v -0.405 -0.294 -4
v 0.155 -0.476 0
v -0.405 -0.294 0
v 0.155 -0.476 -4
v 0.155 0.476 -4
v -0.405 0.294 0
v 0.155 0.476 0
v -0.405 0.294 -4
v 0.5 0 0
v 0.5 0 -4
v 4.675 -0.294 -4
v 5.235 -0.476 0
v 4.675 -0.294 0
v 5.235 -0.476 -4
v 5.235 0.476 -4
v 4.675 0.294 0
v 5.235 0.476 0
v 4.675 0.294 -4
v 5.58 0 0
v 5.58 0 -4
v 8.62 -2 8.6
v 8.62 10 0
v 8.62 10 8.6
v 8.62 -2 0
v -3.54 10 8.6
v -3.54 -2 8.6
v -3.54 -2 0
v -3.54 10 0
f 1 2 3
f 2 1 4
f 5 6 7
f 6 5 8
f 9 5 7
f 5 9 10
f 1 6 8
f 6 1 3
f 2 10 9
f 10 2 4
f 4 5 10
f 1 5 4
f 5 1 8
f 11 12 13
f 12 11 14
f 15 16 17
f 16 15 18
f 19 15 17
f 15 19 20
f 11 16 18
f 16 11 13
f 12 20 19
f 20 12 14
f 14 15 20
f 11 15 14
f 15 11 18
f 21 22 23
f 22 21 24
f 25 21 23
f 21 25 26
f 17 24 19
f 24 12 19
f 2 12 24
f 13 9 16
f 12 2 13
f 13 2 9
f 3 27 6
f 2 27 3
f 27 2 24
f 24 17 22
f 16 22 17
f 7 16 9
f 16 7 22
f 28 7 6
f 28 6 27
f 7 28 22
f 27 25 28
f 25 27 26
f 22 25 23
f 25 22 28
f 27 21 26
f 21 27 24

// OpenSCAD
npin=2;

lgt=(12.16+(npin-2)*5.08);
wid=12;
hgt=8.6;
poff=(lgt-(npin-1)*5.08)/2;

for(i=[0:npin-1]) {
    translate( [i*5.08,0,-4])
        cylinder( 4.5, 0.5, 0.5);
}
translate( [-poff, -2, 0])
    cube( [lgt, wid, hgt]);
